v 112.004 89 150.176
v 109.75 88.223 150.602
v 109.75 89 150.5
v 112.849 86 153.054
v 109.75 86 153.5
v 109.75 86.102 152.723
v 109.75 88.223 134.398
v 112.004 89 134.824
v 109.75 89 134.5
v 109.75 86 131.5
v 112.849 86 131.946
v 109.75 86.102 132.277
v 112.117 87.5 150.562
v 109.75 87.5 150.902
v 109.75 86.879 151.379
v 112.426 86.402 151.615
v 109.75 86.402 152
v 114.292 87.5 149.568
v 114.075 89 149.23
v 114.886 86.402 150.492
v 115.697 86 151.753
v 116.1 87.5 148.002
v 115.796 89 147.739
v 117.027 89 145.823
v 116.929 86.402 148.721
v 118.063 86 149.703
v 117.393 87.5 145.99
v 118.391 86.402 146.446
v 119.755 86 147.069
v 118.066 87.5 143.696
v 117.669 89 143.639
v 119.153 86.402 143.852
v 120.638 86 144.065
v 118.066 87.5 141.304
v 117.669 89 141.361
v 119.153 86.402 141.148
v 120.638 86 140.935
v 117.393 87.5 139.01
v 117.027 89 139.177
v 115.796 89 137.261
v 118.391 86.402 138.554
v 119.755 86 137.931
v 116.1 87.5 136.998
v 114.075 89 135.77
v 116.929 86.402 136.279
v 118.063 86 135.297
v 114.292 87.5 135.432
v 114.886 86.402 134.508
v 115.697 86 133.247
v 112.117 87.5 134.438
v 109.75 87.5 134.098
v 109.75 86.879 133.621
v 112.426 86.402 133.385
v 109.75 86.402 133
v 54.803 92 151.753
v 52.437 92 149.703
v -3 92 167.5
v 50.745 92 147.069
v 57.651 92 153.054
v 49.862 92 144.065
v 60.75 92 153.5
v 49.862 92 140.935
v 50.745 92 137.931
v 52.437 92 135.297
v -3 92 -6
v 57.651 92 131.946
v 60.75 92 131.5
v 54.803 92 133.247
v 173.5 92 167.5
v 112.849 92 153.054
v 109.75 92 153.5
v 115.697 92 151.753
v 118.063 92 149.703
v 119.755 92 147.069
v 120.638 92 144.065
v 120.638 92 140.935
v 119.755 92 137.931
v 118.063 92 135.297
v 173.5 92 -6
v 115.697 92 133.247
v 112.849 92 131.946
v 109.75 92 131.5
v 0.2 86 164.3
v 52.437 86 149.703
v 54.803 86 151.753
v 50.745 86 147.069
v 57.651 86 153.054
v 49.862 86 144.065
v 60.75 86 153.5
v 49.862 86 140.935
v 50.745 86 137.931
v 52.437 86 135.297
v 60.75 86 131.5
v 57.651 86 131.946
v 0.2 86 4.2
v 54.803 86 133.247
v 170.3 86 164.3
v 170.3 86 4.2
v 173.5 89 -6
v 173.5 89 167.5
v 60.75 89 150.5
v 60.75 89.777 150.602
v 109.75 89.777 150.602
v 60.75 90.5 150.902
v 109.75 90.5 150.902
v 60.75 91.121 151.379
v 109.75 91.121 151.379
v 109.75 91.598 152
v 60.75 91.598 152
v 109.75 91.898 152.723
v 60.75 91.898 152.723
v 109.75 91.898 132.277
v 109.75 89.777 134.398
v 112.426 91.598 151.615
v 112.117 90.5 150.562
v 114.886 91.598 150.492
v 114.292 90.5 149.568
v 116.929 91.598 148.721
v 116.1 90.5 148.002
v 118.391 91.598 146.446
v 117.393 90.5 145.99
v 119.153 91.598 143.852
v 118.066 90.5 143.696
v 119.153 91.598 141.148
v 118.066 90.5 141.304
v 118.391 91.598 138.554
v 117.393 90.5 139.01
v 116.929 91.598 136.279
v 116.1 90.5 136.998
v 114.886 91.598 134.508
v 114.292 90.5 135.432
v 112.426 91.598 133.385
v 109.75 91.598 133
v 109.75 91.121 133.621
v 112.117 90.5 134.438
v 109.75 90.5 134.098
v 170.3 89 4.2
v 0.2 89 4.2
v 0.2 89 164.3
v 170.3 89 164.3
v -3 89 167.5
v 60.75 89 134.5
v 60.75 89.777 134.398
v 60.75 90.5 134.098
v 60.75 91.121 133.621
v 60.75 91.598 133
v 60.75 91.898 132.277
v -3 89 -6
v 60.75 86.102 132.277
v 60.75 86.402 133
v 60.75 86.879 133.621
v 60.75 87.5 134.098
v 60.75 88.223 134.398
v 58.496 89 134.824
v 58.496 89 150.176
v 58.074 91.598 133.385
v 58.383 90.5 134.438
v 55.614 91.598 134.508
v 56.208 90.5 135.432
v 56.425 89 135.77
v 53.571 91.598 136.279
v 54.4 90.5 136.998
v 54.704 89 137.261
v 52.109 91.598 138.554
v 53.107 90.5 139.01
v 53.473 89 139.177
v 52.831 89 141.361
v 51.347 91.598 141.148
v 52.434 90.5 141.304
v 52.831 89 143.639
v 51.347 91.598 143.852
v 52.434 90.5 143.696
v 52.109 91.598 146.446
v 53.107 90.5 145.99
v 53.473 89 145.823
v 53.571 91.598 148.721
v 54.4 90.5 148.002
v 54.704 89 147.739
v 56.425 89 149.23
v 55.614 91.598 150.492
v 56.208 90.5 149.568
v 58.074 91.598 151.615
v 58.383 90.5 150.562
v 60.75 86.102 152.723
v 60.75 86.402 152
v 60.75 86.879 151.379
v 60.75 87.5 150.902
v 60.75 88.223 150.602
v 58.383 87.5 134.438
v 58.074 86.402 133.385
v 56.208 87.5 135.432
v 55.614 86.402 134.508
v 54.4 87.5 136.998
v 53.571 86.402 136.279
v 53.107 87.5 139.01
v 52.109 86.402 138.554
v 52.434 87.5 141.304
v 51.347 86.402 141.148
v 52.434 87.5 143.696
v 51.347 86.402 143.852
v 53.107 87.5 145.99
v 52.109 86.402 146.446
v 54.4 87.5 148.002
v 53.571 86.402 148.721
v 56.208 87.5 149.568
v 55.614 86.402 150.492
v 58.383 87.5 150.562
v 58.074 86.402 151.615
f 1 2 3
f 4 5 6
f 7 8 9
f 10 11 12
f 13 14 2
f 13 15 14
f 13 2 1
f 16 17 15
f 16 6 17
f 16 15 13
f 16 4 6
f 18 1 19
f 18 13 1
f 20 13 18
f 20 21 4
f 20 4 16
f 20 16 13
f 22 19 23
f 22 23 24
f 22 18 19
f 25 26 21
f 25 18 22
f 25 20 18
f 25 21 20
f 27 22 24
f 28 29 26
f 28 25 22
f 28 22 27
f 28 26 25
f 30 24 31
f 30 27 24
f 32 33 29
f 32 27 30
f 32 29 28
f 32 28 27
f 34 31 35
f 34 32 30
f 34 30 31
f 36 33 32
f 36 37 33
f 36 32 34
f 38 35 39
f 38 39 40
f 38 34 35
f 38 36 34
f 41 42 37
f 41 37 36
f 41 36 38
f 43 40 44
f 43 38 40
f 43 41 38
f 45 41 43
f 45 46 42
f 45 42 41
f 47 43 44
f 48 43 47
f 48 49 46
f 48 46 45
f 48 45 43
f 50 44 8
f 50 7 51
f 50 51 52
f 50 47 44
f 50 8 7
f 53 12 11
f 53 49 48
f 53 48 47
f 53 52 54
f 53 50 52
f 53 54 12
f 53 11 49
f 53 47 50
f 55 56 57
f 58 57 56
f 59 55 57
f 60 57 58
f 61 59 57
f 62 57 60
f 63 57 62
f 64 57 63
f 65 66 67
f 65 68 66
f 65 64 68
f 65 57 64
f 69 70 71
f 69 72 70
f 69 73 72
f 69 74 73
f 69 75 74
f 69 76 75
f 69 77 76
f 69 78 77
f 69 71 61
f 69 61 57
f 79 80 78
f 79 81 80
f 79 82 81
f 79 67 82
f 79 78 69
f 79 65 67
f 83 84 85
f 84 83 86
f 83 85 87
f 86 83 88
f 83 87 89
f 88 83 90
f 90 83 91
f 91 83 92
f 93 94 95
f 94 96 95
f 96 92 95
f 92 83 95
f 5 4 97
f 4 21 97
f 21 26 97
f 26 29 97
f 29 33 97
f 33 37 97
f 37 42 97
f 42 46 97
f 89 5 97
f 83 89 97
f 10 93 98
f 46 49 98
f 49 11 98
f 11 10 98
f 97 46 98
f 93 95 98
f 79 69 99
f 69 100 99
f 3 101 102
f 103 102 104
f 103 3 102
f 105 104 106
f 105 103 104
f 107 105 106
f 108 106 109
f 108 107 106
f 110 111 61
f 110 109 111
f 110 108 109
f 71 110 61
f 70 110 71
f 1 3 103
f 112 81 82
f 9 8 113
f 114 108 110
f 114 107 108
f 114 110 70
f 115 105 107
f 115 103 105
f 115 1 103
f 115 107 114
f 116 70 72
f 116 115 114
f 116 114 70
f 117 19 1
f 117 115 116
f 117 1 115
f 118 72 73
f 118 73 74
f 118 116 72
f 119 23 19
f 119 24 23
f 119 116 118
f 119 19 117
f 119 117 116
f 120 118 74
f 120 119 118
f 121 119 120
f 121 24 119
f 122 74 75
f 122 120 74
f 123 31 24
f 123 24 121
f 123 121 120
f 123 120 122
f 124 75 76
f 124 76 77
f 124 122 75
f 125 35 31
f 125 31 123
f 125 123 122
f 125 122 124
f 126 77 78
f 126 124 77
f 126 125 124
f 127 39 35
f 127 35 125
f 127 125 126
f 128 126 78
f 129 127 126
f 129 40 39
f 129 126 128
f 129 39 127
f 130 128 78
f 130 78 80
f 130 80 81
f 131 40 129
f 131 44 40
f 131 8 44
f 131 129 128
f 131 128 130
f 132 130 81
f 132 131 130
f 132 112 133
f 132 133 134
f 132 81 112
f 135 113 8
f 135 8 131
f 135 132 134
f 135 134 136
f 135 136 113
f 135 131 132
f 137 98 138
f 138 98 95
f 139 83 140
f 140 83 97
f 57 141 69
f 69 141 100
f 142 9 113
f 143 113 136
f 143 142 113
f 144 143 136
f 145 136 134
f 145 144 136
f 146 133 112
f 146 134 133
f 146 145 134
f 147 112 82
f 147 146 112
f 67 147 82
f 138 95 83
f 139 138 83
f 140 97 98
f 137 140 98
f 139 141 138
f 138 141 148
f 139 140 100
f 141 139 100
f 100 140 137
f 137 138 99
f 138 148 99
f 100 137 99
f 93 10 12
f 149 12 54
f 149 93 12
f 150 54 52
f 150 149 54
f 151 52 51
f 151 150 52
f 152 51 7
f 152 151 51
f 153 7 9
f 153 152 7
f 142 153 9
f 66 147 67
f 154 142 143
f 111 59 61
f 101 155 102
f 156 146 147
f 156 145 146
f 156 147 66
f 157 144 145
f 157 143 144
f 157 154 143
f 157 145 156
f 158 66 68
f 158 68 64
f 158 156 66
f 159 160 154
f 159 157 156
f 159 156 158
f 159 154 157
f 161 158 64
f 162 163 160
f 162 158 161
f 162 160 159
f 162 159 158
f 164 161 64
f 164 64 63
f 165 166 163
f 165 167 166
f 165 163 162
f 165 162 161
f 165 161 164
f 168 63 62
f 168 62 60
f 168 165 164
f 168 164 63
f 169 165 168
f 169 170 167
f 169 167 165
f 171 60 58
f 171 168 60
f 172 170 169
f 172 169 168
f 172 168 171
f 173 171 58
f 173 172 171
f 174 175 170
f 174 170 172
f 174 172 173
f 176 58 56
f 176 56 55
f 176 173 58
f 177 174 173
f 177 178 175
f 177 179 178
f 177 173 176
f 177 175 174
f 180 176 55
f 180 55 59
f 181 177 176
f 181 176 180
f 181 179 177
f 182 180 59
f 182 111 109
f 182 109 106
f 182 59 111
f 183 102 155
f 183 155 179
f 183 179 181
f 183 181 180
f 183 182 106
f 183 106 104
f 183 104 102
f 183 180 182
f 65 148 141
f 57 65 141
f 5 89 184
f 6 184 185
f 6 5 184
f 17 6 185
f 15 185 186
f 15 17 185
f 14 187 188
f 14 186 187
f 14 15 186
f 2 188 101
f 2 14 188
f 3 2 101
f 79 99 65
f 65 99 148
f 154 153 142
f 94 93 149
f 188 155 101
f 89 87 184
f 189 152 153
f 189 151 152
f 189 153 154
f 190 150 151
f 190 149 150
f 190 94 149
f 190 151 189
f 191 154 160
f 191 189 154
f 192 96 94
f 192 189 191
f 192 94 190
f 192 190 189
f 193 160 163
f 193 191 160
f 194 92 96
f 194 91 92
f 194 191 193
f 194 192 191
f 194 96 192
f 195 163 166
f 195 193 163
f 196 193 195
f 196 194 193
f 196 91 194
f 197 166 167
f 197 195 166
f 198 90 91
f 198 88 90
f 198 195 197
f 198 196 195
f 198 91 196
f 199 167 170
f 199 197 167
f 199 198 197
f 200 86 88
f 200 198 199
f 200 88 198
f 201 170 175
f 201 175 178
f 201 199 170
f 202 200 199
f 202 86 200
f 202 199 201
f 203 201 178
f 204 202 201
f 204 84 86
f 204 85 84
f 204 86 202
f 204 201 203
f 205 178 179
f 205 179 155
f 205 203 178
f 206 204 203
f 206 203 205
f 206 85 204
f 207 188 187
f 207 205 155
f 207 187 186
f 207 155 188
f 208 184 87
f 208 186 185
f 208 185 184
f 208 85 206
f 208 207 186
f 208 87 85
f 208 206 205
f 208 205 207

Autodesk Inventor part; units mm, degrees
ref_plane "YZ Plane" through (0, 0, 0) normal (1, 0, 0) x (0, 1, 0)
ref_plane "XZ Plane" through (0, 0, 0) normal (0, 1, 0) x (-1, 0, 0)
ref_plane "Work Plane1" through (0, 86, 164.5) normal (0, 1, 0) x (1, 0, 0)
sketch "Sketch7" plane through (0, 86, 164.5) normal (0, 1, 0) x (1, 0, 0)
  line L0 (-3, 170.5) -> (5, 170.5) construction
  line L1 (-3, 170.5) -> (-3, -3) construction
  line L2 (173.5, -3) -> (-3, -3) construction
  line L3 (173.5, 170.5) -> (173.5, -3) construction
  line L4 (165.5, 170.5) -> (173.5, 170.5) construction
  line L5 (165.5, 170.5) -> (165.5, 167.3) construction
  line L6 (170.5, 167.3) -> (165.5, 167.3) construction
  line L7 (170.5, 167.3) -> (170.5, 164.5) construction
  line L8 (170.5, 164.5) -> (165.5, 164.5) construction
  line L9 (165.5, 164.5) -> (165.5, 160.5) construction
  line L10 (170.5, 160.5) -> (165.5, 160.5) construction
  line L11 (170.5, 160.5) -> (170.5, 0) construction
  line L12 (170.5, 0) -> (0, 0) construction
  line L13 (0, 0) -> (0, 160.5) construction
  line L14 (5, 160.5) -> (0, 160.5) construction
  line L15 (5, 164.5) -> (5, 160.5) construction
  line L16 (5, 164.5) -> (0, 164.5) construction
  line L17 (0, 164.5) -> (0, 167.3) construction
  line L18 (5, 167.3) -> (0, 167.3) construction
  line L19 (5, 170.5) -> (5, 167.3) construction
  line L20 (165.3, 160.3) -> (165.3, 164.7) construction
  line L21 (165.3, 164.7) -> (170.3, 164.7) construction
  line L22 (170.3, 164.7) -> (170.3, 167.1) construction
  line L23 (170.3, 167.1) -> (165.3, 167.1) construction
  line L24 (165.3, 167.1) -> (165.3, 170.7) construction
  line L25 (165.3, 170.7) -> (173.7, 170.7) construction
  line L26 (173.7, 170.7) -> (173.7, -3.2) construction
  line L27 (173.7, -3.2) -> (-3.2, -3.2) construction
  line L28 (-3.2, -3.2) -> (-3.2, 170.7) construction
  line L29 (-3.2, 170.7) -> (5.2, 170.7) construction
  line L30 (5.2, 170.7) -> (5.2, 167.1) construction
  line L31 (5.2, 167.1) -> (0.2, 167.1) construction
  line L32 (0.2, 167.1) -> (0.2, 164.7) construction
  line L33 (0.2, 164.7) -> (5.2, 164.7) construction
  line L34 (5.2, 164.7) -> (5.2, 160.3) construction
  line L35 (5.2, 160.3) -> (0.2, 160.3) construction
  line L36 (0.2, 160.3) -> (0.2, 0.2) construction
  line L37 (0.2, 0.2) -> (170.3, 0.2) construction
  line L38 (170.3, 0.2) -> (170.3, 160.3) construction
  line L39 (170.3, 160.3) -> (165.3, 160.3) construction
  line L40 (170.3, 160.3) -> (0.2, 160.3)
  line L41 (0.2, 160.3) -> (0.2, 0.2)
  line L42 (0.2, 0.2) -> (170.3, 0.2)
  line L43 (170.3, 0.2) -> (170.3, 160.3)
  point P0 (0, 164.5)
  dimension "d18" = 0.2
extrude "Extrusion7" add sketch "Sketch7" along normal blind 3
sketch "Sketch8" plane through (0, 89, 164.5) normal (0, 1, 0) x (1, 0, 0)
  line L0 (-3, 170.5) -> (5, 170.5) construction
  line L1 (-3, 170.5) -> (-3, -3) construction
  line L2 (173.5, -3) -> (-3, -3) construction
  line L3 (173.5, 170.5) -> (173.5, -3) construction
  line L4 (165.5, 170.5) -> (173.5, 170.5) construction
  line L5 (165.5, 170.5) -> (165.5, 167.3) construction
  line L6 (170.5, 167.3) -> (165.5, 167.3) construction
  line L7 (170.5, 167.3) -> (170.5, 164.5) construction
  line L8 (170.5, 164.5) -> (165.5, 164.5) construction
  line L9 (165.5, 164.5) -> (165.5, 160.5) construction
  line L10 (170.5, 160.5) -> (165.5, 160.5) construction
  line L11 (170.5, 160.5) -> (170.5, 0) construction
  line L12 (170.5, 0) -> (0, 0) construction
  line L13 (0, 0) -> (0, 160.5) construction
  line L14 (5, 160.5) -> (0, 160.5) construction
  line L15 (5, 164.5) -> (5, 160.5) construction
  line L16 (5, 164.5) -> (0, 164.5) construction
  line L17 (0, 164.5) -> (0, 167.3) construction
  line L18 (5, 167.3) -> (0, 167.3) construction
  line L19 (5, 170.5) -> (5, 167.3) construction
  line L20 (173.5, 170.5) -> (-3, 170.5) construction
  line L21 (-3, 170.5) -> (-3, -3) construction
  line L22 (-3, -3) -> (173.5, -3) construction
  line L23 (173.5, -3) -> (173.5, 170.5) construction
  line L24 (173.5, 170.5) -> (-3, 170.5)
  line L25 (-3, 170.5) -> (-3, -3)
  line L26 (-3, -3) -> (173.5, -3)
  line L27 (173.5, -3) -> (173.5, 170.5)
  point P0 (0, 164.5)
extrude "Extrusion8" add sketch "Sketch8" along normal blind 3
sketch "Sketch9" plane through (0, 92, 164.5) normal (0, 1, 0) x (1, 0, 0)
  line L0 (-3, 170.5) -> (-3, -3) construction
  line L1 (-3, -3) -> (173.5, -3) construction
  line L2 (173.5, -3) -> (173.5, 170.5) construction
  line L3 (173.5, 170.5) -> (-3, 170.5) construction
  line L4 (109.75, 30) -> (60.75, 30) construction
  line L5 (52.75, 22) -> (52.75, 22) construction
  line L6 (60.75, 14) -> (109.75, 14) construction
  line L7 (117.75, 22) -> (117.75, 22) construction
  line L8 (117.75, 30) -> (52.75, 14) construction
  line L9 (52.75, 30) -> (117.75, 14) construction
  line L10 (85.25, 22) -> (85.25, -3) construction
  arc A0 (109.75, 14) -> (117.75, 22) centre (109.75, 22) ccw construction
  arc A1 (52.75, 22) -> (60.75, 14) centre (60.75, 22) ccw construction
  arc A2 (60.75, 30) -> (52.75, 22) centre (60.75, 22) ccw construction
  arc A3 (117.75, 22) -> (109.75, 30) centre (109.75, 22) ccw construction
  line L11 (109.75, 30) -> (60.75, 30) construction
  line L12 (60.75, 30) -> (60.75, 14) construction
  line L13 (60.75, 14) -> (109.75, 14) construction
  line L14 (109.75, 14) -> (109.75, 30) construction
  line L15 (109.75, 30) -> (60.75, 30)
  line L16 (60.75, 14) -> (109.75, 14)
  arc A4 (109.75, 14) -> (109.75, 30) centre (109.75, 22) ccw
  arc A5 (60.75, 30) -> (60.75, 14) centre (60.75, 22) ccw
  point P0 (0, 164.5)
  dimension "d23" = 65
  dimension "d24" = 16
  dimension "d25" = 25
  dimension "d26" = 8
extrude "Extrusion9" cut sketch "Sketch9" against normal blind 6
fillet "Fillet1" radius 3 8 edges at (52.75, 92, 142.5) (85.25, 92, 134.5) (117.75, 92, 142.5) (85.25, 92, 150.5) (117.75, 86, 142.5) (85.25, 86, 134.5) (52.75, 86, 142.5) (85.25, 86, 150.5)
properties part number "Lid"
